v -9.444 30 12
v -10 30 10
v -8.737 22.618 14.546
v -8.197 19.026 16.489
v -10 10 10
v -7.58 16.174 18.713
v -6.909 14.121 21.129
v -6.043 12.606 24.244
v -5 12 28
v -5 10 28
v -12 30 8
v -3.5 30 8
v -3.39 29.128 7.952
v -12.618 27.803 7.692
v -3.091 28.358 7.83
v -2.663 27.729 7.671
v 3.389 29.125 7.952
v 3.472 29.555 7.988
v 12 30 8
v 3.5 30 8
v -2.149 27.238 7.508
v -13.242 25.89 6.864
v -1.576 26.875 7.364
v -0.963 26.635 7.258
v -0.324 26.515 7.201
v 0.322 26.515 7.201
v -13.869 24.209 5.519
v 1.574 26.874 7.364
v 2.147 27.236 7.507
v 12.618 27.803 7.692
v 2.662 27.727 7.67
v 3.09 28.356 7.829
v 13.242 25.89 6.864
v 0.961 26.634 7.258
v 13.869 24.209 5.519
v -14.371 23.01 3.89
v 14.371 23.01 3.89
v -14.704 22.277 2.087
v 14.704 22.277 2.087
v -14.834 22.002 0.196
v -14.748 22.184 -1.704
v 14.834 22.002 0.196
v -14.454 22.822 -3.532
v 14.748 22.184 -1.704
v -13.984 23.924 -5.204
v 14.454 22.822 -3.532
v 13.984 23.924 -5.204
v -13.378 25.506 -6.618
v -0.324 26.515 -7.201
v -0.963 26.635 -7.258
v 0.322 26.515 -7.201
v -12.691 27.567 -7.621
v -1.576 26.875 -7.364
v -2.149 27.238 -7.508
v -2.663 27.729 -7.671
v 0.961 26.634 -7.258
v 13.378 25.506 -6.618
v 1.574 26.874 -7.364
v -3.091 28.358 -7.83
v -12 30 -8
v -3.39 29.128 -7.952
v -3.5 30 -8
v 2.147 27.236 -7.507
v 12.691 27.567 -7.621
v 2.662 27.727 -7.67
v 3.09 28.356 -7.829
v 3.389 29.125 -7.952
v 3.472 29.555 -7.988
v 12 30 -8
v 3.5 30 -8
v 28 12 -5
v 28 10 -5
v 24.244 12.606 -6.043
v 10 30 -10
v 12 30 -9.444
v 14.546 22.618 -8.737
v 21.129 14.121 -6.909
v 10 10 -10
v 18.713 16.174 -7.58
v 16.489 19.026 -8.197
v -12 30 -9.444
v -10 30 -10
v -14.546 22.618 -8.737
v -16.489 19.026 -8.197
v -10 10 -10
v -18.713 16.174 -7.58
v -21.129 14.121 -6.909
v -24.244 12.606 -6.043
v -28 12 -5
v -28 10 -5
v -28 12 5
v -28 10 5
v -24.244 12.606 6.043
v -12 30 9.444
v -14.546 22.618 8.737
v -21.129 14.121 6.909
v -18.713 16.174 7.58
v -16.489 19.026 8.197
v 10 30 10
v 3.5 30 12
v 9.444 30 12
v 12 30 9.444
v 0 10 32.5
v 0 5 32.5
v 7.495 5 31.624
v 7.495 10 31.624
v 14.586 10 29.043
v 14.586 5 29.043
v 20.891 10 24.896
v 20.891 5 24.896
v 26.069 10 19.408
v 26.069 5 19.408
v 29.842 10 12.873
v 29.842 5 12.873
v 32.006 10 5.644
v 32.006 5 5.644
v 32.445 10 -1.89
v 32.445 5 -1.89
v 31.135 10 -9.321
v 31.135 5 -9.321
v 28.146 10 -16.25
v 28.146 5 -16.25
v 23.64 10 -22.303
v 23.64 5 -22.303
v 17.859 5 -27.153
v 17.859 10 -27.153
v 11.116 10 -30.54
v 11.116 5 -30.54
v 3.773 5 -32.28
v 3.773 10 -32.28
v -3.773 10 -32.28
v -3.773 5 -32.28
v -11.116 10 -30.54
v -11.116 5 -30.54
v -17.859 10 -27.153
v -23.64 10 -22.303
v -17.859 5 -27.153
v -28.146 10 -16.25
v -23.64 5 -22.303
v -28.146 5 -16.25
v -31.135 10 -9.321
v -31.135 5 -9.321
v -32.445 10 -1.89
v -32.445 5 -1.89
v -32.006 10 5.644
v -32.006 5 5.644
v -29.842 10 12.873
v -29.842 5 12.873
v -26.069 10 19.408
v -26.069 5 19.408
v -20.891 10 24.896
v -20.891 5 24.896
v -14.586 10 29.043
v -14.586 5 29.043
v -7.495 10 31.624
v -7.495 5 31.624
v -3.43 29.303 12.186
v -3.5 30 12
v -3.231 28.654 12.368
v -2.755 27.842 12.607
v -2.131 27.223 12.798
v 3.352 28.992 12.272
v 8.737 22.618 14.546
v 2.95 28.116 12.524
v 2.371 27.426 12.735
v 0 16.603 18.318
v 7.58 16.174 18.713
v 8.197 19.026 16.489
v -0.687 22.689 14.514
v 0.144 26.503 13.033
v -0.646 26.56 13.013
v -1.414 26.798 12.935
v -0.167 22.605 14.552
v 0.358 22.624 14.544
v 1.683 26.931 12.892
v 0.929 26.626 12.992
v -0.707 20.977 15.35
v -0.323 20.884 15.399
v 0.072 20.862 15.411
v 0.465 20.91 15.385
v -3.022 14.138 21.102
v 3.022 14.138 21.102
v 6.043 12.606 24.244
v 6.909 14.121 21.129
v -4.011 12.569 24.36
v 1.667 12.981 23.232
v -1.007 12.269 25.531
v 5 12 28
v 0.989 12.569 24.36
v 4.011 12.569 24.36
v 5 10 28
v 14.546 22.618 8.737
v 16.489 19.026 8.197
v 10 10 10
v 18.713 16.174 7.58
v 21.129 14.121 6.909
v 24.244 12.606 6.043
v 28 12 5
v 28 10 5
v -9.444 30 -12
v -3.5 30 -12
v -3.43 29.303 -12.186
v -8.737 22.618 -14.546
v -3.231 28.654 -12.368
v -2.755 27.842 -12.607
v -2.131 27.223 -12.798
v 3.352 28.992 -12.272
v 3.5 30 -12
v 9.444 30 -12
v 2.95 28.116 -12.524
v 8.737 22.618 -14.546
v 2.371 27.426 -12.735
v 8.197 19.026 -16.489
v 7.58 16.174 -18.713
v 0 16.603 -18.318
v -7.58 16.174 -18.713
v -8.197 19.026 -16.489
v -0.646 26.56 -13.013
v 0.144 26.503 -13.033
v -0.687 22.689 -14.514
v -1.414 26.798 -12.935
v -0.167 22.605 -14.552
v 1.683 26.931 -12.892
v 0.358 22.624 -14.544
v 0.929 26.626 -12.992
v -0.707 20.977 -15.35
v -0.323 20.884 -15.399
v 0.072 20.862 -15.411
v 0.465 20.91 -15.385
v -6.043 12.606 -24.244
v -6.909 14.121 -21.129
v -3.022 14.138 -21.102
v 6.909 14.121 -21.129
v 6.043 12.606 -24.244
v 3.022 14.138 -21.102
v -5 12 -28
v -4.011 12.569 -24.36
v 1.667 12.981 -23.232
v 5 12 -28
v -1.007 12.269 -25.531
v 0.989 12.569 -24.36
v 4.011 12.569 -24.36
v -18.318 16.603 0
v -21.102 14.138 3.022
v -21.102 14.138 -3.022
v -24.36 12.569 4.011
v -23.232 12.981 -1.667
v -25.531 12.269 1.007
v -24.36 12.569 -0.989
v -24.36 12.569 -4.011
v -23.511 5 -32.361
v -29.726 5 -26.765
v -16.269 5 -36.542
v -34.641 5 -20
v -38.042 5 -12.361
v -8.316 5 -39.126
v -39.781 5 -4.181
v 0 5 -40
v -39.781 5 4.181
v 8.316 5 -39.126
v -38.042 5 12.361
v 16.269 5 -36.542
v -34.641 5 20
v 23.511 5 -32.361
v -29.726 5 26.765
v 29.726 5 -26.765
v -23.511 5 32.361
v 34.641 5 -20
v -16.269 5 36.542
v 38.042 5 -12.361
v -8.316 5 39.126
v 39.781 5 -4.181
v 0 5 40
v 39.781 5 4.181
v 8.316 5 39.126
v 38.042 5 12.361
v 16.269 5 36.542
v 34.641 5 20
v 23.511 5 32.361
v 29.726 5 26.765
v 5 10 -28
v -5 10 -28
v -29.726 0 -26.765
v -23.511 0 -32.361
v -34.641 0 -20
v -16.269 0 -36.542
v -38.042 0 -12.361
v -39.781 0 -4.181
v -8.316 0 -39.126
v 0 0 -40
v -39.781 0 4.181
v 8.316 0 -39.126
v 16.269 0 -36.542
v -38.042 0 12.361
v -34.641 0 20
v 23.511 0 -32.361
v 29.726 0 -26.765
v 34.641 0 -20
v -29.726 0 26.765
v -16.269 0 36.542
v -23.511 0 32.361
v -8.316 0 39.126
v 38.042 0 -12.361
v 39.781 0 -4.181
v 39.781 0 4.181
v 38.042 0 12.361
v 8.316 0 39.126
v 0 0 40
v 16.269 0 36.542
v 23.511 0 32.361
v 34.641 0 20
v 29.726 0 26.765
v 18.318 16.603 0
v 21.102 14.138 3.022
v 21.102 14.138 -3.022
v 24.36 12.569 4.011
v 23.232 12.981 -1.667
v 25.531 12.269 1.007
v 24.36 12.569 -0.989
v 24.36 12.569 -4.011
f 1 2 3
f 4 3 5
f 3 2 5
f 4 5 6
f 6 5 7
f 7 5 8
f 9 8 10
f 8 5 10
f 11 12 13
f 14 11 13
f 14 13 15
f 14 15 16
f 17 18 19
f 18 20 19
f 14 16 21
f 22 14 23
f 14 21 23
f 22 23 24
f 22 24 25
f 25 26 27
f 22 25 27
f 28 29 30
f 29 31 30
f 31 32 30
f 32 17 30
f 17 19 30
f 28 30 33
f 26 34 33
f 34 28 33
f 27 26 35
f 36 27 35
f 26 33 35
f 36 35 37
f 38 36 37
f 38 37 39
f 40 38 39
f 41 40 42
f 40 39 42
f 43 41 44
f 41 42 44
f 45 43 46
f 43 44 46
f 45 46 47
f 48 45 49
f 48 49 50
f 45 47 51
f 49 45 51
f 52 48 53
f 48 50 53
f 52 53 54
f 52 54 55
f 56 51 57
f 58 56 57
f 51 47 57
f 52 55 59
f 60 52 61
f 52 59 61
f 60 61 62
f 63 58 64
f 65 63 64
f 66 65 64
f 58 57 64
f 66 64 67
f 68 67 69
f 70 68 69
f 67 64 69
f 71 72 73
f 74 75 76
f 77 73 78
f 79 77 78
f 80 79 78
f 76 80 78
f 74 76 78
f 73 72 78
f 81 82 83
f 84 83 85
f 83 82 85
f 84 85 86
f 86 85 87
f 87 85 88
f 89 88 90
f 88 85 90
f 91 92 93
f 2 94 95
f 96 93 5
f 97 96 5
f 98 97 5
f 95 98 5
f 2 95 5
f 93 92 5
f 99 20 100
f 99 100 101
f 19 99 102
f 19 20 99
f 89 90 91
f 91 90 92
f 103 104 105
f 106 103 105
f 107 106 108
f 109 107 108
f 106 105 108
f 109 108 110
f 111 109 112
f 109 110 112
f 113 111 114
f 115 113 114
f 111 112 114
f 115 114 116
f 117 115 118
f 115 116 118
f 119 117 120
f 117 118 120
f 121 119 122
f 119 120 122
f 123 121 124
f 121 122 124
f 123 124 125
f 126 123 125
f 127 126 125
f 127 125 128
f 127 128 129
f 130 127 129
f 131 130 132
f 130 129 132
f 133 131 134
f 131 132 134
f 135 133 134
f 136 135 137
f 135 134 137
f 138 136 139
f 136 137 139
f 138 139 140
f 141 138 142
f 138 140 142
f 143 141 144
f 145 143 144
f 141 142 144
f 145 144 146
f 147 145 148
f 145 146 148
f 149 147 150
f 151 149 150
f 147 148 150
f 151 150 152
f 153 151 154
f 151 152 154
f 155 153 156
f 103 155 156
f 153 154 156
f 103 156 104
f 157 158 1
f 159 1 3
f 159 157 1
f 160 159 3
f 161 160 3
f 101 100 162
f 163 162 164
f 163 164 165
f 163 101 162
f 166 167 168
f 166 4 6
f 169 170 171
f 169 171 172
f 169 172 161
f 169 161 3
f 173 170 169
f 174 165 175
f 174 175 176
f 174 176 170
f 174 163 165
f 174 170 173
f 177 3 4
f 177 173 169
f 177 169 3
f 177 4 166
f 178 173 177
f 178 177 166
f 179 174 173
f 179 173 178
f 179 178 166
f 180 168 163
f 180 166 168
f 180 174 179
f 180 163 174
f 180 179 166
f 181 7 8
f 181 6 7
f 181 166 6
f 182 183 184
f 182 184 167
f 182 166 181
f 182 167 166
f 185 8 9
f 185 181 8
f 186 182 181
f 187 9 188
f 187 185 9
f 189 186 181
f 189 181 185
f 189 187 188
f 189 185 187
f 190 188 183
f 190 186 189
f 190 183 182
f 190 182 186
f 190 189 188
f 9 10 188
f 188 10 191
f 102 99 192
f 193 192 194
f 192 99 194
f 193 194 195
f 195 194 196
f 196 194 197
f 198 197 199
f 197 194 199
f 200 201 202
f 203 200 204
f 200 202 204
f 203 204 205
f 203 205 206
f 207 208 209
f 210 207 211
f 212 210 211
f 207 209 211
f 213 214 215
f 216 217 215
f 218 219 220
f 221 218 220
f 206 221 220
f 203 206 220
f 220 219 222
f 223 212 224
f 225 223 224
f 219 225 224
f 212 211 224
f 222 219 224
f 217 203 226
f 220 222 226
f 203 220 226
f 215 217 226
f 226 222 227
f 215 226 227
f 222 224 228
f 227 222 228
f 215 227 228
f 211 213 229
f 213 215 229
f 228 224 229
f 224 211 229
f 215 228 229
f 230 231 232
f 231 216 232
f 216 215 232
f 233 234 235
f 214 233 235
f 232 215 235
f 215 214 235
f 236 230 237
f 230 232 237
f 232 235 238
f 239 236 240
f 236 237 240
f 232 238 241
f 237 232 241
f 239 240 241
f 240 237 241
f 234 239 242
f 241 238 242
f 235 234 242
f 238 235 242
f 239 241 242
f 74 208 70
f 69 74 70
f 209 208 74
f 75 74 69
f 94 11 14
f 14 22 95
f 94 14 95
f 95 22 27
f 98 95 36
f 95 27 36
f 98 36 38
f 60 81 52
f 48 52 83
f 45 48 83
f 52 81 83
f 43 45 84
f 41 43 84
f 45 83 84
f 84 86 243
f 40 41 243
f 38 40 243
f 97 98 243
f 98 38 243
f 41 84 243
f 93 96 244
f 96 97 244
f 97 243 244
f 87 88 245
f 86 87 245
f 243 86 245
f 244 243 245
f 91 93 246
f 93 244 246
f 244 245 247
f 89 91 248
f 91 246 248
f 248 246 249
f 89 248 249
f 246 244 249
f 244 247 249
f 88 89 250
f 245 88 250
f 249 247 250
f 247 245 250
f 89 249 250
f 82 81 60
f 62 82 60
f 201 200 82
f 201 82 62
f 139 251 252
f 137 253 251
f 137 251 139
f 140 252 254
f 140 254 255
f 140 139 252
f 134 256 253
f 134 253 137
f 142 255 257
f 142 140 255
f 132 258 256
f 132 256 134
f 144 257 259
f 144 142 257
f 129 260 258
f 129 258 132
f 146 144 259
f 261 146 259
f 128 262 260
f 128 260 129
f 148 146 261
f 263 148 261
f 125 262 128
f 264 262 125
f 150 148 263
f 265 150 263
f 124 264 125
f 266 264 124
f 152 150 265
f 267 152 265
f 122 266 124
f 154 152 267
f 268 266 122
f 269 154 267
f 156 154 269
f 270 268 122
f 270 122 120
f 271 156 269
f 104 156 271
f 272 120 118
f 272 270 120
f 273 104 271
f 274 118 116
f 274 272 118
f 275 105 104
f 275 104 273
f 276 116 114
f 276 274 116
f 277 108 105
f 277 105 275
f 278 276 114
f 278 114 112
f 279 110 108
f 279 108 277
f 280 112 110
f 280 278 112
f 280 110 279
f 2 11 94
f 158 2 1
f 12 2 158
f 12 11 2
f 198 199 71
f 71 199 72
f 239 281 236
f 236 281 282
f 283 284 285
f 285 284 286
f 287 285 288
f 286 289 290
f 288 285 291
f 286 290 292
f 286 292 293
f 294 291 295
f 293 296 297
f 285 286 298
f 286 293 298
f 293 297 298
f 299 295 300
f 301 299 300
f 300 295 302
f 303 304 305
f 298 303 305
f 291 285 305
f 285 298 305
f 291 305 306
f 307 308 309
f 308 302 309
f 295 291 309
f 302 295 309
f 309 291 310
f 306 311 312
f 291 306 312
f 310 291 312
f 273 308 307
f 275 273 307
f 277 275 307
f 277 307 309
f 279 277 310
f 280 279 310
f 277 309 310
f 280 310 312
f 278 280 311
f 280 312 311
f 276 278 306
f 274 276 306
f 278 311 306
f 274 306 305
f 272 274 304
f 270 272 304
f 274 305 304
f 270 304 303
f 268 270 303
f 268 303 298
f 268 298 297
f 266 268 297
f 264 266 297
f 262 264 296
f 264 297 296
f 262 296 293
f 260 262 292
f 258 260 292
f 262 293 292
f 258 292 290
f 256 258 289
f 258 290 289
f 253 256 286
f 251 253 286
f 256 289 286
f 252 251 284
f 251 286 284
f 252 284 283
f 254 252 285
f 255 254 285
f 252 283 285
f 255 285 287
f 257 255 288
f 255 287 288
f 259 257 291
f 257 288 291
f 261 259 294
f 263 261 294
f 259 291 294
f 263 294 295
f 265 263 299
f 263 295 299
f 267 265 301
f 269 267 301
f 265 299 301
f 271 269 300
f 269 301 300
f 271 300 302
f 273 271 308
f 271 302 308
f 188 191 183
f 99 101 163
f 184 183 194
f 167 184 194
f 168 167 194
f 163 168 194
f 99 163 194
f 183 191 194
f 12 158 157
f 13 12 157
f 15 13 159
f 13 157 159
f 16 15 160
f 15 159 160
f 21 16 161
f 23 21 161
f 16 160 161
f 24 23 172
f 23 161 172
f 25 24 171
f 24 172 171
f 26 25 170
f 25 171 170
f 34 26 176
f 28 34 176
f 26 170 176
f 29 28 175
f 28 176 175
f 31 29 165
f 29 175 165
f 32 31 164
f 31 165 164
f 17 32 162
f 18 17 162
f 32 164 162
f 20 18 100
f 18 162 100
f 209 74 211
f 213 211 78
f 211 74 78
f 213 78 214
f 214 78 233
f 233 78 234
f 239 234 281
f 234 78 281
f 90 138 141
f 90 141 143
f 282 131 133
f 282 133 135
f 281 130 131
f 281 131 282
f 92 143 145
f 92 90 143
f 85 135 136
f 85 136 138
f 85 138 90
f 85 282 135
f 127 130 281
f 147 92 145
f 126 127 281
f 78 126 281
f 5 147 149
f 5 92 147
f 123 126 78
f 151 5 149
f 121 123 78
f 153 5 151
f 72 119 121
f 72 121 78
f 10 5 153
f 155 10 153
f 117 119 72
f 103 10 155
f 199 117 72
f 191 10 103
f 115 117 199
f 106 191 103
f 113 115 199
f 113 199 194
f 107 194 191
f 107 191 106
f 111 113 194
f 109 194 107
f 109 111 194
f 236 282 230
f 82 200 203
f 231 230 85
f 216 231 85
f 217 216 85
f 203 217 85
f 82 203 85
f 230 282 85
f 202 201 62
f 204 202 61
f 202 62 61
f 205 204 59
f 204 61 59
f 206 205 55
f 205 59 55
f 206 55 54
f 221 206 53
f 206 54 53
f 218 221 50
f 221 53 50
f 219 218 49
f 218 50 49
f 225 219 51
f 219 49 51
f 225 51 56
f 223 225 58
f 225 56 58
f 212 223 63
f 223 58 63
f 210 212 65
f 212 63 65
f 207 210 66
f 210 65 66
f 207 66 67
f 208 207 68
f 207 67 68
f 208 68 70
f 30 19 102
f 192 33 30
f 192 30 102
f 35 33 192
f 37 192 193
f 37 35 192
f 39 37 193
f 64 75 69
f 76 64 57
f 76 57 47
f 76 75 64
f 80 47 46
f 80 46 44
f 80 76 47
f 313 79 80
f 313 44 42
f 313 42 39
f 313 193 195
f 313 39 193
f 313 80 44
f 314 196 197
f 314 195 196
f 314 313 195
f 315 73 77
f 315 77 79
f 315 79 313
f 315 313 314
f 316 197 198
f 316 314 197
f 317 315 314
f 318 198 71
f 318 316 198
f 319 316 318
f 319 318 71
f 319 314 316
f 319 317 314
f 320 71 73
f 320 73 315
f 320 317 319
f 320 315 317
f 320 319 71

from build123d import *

# Parameters (mm, degrees)
SKETCH1_R           = 40
BOSS_EXTRUDE1_DEPTH = 5
SKETCH2_R           = 32.5
BOSS_EXTRUDE2_DEPTH = 5
BOSS_EXTRUDE3_DEPTH = 20
CUT_EXTRUDE15_DEPTH = 85.403791384
CUT_EXTRUDE16_DEPTH = 85.40379142
CUT_EXTRUDE22_DEPTH = 85.40379142
CUT_EXTRUDE23_DEPTH = 85.40379142


with BuildPart() as part:
    # Sketch1 → Boss-Extrude1 (new body)
    with BuildSketch(Plane(origin=(0, 0, 0), x_dir=(1, 0, 0), z_dir=(0, 1, 0))):
        Circle(SKETCH1_R)
    extrude(amount=BOSS_EXTRUDE1_DEPTH)

    # Sketch2 → Boss-Extrude2 (add)
    with BuildSketch(Plane(origin=(0, 5, 0), x_dir=(1, 0, 0), z_dir=(0, 1, 0))):
        Circle(SKETCH2_R)
    extrude(amount=BOSS_EXTRUDE2_DEPTH)

    # Sketch6 → Boss-Extrude3 (add)
    with BuildSketch(Plane(origin=(0, 10, 0), x_dir=(1, 0, 0), z_dir=(0, 1, 0))):
        Polygon((5, -28), (10, -10), (28, -5), (28, 5), (10, 10), (5, 28), (-5, 28), (-10, 10), (-28, 5), (-28, -5), (-10, -10), (-5, -28), align=None)
    extrude(amount=BOSS_EXTRUDE3_DEPTH)

    # Sketch12 → Cut-Extrude15 (cut, through all)
    with BuildSketch(Plane(origin=(0, 0, -28), x_dir=(-1, 0, 0), z_dir=(0, 0, -1))):
        with BuildLine():
            add(Edge.make_bspline(
                [(12, 30), (16.636316338, 12.206521784), (28, 12)],
                knots=[0, 0, 0, 0.849765105, 0.849765105, 0.849765105], degree=2))
            Line((28, 12), (28, 30))
            Line((28, 30), (12, 30))
        make_face()
        with BuildLine():
            Line((-28, 30), (-28, 12))
            add(Edge.make_bspline(
                [(-12, 30), (-16.636316338, 12.206521784), (-28, 12)],
                knots=[0, 0, 0, 0.849765105, 0.849765105, 0.849765105], degree=2))
            Line((-12, 30), (-28, 30))
        make_face()
    extrude(amount=-CUT_EXTRUDE15_DEPTH, mode=Mode.SUBTRACT)

    # Sketch13 → Cut-Extrude16 (cut, through all)
    with BuildSketch(Plane(origin=(28, 0, 0), x_dir=(0, 0, -1), z_dir=(1, 0, 0))):
        with BuildLine():
            add(Edge.make_bspline(
                [(12, 30), (16.636316338, 12.206521784), (28, 12)],
                knots=[0, 0, 0, 0.849765105, 0.849765105, 0.849765105], degree=2))
            Line((28, 12), (28, 30))
            Line((28, 30), (12, 30))
        make_face()
        with BuildLine():
            Line((-28, 30), (-28, 12))
            add(Edge.make_bspline(
                [(-12, 30), (-16.636316338, 12.206521784), (-28, 12)],
                knots=[0, 0, 0, 0.849765105, 0.849765105, 0.849765105], degree=2))
            Line((-12, 30), (-28, 30))
        make_face()
    extrude(amount=-CUT_EXTRUDE16_DEPTH, mode=Mode.SUBTRACT)

    # Sketch15 → Cut-Extrude22 (cut, through all)
    with BuildSketch(Plane.XY.offset(28)):
        with BuildLine():
            ThreePointArc((-3.5, 30), (0, 26.5), (3.5, 30))
            Line((3.5, 30), (-3.5, 30))
        make_face()
    extrude(amount=-CUT_EXTRUDE22_DEPTH, mode=Mode.SUBTRACT)

    # Sketch16 → Cut-Extrude23 (cut, through all)
    with BuildSketch(Plane(origin=(28, 0, 0), x_dir=(0, 0, -1), z_dir=(1, 0, 0))):
        with BuildLine():
            ThreePointArc((-8, 30), (0, 22), (8, 30))
            Line((8, 30), (-8, 30))
        make_face()
    extrude(amount=-CUT_EXTRUDE23_DEPTH, mode=Mode.SUBTRACT)


solid = part.part
